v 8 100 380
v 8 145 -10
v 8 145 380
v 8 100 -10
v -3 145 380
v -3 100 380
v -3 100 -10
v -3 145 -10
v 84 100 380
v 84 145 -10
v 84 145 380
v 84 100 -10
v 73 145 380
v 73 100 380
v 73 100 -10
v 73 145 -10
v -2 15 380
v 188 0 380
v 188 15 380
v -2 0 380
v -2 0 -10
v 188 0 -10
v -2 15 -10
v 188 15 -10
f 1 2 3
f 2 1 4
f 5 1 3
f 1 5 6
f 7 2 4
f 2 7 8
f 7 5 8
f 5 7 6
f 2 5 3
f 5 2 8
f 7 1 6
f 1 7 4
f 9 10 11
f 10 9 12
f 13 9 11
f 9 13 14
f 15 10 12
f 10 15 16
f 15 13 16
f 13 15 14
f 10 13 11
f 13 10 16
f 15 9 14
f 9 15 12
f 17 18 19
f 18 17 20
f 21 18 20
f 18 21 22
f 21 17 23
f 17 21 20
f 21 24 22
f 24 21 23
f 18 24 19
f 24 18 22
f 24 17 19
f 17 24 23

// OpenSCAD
// file: robot_settings.scad
main_box_x = 95.5; // 96
main_box_y = 102;
main_box_z = 74; // 74.5
wall_thickness = 2;

rail_gap = 2;
rail_inset = 7;

rail_thickness = 3.9;
rail_length = 200;

pinion_gear_thickness = 6;
pinion_gear_hole_diameter = 4;
// main file
include <robot_settings.scad>

$fa=1;
$fs=0.4;

////////////////////////////////////////////////
module engine_holder_cutouts() {
    translate([-.03, 1,-.10])
    cube([.11, .45, rail_thickness ]);

    translate([.73, 1,-.10])
    cube([.11, .45, rail_thickness ]);

    translate([1.88,0,-.10])
    rotate([0,0,90])
    cube([.15, 1.9, rail_thickness]);
}
scale([100,100,100])
engine_holder_cutouts();
